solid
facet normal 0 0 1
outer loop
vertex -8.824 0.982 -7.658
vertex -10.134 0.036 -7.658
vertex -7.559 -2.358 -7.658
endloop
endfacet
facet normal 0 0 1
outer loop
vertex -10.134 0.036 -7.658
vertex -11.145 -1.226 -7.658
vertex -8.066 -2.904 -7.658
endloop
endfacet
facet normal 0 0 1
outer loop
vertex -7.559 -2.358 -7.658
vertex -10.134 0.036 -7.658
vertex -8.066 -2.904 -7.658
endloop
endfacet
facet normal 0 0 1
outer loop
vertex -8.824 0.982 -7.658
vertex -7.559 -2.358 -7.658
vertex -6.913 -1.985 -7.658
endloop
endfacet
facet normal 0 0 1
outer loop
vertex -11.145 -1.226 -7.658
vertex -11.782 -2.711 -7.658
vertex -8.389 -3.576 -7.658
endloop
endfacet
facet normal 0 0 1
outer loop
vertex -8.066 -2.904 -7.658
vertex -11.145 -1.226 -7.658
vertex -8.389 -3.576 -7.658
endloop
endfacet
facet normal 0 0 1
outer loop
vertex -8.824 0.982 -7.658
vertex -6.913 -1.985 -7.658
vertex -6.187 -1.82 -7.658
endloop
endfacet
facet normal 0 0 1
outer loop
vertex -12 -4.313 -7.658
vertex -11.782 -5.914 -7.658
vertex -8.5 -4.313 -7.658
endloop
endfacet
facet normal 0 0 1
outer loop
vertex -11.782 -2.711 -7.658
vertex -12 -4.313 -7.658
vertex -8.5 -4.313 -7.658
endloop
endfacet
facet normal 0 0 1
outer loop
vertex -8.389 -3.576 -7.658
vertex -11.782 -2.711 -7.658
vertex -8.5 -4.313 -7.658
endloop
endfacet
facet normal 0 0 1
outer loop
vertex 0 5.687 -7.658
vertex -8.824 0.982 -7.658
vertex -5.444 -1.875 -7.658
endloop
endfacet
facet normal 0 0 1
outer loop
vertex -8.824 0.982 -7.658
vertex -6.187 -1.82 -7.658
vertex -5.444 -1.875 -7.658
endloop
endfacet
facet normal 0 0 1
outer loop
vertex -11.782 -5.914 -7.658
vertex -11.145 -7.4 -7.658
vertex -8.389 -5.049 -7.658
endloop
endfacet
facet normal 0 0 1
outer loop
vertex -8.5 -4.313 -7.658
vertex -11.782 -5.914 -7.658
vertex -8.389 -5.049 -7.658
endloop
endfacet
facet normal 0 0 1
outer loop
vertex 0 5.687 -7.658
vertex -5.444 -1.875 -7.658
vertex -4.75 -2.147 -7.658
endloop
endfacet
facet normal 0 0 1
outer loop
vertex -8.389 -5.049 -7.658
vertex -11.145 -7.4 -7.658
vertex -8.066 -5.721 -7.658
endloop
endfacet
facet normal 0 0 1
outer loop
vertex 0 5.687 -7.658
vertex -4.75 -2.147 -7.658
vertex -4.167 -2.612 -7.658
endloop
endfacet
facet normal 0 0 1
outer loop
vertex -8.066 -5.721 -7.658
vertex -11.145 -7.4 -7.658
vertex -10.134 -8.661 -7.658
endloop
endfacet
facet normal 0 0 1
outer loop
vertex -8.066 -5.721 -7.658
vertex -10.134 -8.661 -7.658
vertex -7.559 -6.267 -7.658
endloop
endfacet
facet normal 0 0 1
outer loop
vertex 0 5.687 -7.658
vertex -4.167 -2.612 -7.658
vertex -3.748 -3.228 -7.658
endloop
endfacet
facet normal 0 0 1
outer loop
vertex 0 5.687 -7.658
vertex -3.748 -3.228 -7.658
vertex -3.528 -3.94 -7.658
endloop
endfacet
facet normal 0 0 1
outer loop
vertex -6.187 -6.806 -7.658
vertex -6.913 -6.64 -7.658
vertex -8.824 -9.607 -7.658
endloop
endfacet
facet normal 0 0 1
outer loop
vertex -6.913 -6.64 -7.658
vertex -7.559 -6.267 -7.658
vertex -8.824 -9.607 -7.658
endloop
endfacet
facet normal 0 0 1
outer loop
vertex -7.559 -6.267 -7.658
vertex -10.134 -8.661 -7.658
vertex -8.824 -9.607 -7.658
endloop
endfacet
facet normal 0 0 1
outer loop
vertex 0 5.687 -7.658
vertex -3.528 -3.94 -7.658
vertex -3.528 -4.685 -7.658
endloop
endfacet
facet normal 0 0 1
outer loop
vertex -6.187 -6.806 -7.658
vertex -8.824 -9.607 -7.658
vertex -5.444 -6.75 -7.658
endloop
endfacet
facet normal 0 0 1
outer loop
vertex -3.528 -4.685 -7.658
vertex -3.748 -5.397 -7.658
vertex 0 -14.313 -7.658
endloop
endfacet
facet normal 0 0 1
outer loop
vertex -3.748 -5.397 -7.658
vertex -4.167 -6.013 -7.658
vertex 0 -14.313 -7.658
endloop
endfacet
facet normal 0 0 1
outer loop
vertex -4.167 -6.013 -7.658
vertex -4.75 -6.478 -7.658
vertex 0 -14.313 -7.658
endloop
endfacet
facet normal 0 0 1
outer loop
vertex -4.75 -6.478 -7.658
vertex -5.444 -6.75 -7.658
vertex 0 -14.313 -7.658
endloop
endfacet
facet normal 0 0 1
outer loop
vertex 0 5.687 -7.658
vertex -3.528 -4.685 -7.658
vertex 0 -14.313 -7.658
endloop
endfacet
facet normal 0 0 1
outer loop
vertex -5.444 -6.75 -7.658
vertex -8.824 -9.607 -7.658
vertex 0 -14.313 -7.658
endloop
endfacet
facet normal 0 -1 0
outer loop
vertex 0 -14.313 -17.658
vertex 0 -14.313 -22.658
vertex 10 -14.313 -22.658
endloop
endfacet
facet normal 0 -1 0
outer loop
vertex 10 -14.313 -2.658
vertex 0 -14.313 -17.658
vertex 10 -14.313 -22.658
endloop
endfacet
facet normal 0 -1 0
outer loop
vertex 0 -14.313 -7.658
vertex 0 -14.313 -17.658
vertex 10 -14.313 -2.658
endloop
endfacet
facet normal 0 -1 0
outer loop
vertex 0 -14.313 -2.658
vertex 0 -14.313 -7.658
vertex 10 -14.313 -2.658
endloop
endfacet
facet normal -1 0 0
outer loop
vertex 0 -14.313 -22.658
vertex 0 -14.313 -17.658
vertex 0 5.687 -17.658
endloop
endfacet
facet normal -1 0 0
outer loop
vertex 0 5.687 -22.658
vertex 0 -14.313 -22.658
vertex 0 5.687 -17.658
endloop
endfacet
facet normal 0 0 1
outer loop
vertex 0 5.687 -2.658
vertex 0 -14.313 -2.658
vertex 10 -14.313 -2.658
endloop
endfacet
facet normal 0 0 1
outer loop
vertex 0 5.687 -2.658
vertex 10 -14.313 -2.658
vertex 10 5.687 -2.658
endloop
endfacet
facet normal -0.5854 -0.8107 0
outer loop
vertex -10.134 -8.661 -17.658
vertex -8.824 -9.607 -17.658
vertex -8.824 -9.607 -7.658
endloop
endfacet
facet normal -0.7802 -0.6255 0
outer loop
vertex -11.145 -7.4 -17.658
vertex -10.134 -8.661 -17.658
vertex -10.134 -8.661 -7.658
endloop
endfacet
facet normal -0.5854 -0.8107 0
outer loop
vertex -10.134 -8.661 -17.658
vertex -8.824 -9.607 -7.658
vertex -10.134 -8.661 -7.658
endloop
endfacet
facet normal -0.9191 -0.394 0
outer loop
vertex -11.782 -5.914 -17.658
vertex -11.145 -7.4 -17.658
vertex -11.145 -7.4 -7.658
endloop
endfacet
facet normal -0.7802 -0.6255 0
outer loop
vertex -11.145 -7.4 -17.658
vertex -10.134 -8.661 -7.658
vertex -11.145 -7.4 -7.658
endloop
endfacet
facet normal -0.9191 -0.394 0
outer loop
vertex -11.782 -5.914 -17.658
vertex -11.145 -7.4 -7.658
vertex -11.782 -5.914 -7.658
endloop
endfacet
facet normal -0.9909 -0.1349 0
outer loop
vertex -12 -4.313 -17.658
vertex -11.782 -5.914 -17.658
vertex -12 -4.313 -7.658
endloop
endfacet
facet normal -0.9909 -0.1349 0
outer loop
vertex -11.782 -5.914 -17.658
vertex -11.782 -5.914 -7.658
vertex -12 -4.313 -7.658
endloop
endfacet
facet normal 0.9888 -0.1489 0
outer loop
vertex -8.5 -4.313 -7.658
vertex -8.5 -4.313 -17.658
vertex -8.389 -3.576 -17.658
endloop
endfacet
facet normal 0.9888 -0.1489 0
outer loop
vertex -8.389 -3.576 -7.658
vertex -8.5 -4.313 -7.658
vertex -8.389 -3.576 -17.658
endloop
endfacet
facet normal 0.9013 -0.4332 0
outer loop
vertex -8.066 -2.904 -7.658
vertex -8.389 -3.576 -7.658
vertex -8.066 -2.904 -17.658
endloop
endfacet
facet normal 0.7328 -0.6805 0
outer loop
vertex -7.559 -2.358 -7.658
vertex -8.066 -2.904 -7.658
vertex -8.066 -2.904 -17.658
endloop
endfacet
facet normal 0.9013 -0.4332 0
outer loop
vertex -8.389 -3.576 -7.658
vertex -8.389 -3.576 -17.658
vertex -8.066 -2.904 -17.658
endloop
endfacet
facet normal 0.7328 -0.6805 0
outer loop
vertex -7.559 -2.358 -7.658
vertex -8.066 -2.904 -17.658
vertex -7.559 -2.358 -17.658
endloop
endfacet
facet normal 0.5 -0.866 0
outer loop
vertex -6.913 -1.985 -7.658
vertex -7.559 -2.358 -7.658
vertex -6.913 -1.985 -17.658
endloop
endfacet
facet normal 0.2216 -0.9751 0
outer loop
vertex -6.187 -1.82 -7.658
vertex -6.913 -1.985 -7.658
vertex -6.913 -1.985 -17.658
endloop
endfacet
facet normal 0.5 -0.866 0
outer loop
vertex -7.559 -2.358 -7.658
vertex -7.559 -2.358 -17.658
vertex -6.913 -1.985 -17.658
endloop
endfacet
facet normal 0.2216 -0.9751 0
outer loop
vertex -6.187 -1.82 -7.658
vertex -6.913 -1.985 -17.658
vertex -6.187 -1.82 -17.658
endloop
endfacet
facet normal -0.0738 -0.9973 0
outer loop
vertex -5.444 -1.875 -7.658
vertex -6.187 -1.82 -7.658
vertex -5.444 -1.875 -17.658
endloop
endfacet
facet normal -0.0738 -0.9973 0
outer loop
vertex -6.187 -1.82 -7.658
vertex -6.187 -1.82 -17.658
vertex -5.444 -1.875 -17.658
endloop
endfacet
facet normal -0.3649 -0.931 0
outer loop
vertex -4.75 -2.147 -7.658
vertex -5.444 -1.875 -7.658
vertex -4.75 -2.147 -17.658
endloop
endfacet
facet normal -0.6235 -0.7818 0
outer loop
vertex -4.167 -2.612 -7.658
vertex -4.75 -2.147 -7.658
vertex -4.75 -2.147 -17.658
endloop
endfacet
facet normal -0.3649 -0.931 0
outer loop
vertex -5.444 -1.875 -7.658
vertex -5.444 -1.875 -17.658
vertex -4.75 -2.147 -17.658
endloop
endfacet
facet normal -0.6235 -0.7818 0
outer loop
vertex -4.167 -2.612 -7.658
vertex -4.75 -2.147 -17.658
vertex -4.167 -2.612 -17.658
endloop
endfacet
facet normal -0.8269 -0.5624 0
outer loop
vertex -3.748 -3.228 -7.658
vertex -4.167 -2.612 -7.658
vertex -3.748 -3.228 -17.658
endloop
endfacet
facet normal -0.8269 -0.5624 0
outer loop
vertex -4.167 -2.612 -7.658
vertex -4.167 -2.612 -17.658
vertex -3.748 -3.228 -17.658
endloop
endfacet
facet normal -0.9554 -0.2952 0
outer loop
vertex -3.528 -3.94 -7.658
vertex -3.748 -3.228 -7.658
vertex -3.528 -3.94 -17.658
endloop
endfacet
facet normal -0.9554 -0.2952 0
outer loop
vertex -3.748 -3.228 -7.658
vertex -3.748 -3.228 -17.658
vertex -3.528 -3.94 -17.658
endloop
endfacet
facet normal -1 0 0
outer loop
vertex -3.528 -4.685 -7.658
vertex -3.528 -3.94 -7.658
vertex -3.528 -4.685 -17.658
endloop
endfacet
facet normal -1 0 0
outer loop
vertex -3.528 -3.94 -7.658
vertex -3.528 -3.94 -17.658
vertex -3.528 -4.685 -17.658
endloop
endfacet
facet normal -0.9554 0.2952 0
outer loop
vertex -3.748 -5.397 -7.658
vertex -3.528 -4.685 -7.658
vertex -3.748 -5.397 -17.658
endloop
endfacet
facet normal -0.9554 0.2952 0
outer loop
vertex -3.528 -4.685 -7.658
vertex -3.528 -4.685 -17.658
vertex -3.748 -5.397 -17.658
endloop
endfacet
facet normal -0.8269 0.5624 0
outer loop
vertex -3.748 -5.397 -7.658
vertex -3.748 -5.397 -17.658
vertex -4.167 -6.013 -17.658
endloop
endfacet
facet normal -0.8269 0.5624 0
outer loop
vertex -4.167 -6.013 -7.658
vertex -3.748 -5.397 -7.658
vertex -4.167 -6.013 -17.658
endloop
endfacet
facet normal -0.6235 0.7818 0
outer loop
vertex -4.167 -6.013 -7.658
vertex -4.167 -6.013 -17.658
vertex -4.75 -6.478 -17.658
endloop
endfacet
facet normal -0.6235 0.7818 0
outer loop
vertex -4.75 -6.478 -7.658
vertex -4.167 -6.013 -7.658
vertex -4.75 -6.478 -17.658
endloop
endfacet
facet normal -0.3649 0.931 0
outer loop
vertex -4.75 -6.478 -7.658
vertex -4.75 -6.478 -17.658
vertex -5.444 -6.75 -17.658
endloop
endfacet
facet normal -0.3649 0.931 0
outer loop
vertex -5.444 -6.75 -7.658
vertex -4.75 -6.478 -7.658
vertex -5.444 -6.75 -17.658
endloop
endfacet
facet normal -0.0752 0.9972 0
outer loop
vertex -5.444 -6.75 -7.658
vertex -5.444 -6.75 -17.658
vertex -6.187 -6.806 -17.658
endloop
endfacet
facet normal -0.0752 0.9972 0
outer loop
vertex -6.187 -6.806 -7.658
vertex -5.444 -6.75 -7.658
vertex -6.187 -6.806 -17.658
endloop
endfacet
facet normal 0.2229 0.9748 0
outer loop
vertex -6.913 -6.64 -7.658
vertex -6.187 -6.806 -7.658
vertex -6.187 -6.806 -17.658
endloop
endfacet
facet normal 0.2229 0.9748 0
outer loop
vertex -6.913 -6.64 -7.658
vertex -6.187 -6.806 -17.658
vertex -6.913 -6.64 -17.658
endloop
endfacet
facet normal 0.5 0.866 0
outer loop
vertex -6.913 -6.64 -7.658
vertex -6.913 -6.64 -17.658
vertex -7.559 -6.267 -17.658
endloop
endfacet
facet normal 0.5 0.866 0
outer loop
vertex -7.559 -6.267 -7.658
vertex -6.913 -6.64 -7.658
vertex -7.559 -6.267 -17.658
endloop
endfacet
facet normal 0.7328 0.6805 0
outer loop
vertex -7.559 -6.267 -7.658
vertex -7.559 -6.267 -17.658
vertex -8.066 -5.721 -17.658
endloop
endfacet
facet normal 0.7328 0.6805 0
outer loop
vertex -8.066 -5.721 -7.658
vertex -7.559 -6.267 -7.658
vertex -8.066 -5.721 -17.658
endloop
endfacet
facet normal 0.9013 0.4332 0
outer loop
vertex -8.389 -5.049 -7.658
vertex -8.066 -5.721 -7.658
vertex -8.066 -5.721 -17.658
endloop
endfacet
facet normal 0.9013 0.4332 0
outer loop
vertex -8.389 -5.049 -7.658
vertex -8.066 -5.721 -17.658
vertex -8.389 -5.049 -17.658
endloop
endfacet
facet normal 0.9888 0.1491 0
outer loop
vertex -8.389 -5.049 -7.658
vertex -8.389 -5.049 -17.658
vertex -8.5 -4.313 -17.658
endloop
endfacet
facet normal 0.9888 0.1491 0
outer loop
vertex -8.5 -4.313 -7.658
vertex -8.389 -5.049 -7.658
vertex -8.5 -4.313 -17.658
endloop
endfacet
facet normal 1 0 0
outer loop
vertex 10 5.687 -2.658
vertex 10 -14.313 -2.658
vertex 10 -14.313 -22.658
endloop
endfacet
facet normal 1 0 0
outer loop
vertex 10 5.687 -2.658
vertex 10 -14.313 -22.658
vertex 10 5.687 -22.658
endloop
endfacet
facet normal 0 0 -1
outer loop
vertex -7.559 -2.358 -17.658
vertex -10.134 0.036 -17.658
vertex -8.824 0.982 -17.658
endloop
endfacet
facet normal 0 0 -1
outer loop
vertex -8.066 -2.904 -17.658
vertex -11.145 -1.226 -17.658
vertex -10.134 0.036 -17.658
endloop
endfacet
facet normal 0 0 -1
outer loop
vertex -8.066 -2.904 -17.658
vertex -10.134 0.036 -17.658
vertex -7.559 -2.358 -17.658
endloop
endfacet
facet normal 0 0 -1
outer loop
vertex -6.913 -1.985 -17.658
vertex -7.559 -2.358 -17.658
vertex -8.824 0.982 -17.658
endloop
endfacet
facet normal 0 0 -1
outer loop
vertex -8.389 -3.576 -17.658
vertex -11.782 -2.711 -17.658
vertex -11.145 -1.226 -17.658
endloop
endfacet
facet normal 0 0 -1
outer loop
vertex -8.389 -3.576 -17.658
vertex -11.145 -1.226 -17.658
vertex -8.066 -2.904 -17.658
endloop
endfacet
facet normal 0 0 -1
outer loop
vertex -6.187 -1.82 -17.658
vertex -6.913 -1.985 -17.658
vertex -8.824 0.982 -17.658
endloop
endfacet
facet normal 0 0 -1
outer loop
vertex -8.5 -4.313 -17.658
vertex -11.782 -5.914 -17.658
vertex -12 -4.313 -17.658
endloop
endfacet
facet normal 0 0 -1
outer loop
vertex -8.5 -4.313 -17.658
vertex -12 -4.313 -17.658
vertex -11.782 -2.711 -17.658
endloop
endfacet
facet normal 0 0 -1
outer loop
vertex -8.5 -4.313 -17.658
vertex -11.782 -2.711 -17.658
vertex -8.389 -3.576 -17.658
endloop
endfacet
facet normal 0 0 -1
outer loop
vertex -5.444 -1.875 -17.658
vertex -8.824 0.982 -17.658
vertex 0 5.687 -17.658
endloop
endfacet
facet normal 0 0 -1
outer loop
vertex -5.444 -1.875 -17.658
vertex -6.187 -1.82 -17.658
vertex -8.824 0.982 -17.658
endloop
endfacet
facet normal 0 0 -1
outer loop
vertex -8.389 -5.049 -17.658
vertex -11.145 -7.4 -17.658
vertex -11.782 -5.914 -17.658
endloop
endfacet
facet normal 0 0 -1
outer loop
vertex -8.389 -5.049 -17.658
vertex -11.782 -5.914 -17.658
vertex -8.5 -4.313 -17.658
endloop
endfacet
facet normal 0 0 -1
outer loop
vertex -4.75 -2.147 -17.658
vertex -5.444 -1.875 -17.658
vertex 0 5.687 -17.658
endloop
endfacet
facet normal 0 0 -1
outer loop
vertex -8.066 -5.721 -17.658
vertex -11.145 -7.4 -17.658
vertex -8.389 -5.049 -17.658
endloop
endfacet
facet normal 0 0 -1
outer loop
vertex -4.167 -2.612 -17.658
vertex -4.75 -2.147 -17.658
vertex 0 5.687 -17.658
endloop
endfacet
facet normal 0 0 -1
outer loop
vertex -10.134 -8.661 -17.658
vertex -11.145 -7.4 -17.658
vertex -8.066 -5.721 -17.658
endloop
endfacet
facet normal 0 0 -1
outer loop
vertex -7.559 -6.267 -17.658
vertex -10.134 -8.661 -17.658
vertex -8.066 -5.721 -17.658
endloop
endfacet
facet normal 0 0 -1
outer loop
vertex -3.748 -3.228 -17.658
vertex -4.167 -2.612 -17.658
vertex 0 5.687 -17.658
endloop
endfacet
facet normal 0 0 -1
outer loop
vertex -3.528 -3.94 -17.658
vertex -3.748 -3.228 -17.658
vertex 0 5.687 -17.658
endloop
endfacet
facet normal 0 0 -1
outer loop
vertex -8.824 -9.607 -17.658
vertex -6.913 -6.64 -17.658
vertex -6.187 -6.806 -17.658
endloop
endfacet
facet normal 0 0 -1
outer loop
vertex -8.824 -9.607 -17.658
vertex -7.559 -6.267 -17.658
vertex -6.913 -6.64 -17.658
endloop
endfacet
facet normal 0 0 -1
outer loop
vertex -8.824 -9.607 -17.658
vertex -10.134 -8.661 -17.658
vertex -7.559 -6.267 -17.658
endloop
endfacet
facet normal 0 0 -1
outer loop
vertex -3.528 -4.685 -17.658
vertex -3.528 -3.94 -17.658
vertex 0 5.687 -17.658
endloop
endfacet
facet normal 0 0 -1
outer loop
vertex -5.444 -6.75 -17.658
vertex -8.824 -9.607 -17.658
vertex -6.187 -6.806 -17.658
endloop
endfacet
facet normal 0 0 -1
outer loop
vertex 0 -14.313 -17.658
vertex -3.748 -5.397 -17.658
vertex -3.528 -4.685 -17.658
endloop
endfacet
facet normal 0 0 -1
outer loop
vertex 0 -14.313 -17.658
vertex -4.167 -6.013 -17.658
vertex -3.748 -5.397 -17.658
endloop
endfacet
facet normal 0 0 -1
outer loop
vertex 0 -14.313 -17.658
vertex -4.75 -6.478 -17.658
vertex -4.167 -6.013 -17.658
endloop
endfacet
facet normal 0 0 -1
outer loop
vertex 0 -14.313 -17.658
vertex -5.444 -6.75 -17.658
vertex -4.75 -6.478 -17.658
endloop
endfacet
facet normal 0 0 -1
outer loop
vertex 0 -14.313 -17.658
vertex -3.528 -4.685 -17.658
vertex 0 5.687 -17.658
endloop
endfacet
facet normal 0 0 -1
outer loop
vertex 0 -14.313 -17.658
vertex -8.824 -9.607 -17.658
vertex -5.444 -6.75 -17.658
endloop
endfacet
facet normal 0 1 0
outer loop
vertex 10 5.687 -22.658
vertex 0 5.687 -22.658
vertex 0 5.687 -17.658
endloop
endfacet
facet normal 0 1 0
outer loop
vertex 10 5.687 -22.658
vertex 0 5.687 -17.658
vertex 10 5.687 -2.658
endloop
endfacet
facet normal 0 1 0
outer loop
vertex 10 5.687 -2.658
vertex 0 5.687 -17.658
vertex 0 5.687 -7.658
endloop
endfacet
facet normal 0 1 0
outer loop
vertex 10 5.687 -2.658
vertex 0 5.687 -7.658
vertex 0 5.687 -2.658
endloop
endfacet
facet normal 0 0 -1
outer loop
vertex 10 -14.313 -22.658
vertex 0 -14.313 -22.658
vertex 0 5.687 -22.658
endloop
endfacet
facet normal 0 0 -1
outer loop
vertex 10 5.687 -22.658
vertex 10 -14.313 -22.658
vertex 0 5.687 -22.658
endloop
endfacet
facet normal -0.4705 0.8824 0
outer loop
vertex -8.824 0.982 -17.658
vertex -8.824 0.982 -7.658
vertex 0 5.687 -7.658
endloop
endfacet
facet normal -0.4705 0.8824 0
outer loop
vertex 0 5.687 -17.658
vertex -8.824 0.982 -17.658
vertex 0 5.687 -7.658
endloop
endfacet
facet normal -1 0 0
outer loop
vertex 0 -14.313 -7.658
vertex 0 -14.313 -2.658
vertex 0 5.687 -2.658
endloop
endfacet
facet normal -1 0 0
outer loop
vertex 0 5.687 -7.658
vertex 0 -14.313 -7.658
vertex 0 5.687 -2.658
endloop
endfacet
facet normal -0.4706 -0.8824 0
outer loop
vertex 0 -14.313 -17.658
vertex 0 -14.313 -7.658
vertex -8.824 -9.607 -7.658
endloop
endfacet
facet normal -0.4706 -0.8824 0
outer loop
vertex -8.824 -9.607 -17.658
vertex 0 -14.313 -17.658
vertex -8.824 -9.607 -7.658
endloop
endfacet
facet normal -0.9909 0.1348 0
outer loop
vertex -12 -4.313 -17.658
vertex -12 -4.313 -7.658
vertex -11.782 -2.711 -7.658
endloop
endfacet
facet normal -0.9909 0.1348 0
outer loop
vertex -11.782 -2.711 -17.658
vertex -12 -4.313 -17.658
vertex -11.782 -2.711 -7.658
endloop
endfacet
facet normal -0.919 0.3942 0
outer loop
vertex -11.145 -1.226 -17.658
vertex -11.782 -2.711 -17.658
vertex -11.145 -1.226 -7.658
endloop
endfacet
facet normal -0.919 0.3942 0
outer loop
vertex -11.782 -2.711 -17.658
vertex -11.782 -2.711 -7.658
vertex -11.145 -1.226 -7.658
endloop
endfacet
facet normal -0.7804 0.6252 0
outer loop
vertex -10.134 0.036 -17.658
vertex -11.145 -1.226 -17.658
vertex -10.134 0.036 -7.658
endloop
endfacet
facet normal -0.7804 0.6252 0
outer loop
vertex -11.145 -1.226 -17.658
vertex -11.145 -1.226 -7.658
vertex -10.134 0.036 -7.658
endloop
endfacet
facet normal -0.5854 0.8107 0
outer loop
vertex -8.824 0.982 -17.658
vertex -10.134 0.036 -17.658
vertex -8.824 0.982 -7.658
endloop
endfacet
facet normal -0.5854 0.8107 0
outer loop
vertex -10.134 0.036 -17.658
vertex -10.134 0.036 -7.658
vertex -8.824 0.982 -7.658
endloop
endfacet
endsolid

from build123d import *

# Parameters (mm, degrees)
F0_W     = 20
F0_H     = 20
F1_DEPTH = 10
F2_W     = 12
F2_H     = 10
F3_DEPTH = 20
F5_DEPTH = 25
F6_D     = 5


with BuildPart() as f1:
    # F0 (on Right) → F1 (new body)
    with BuildSketch(Plane.YZ):
        with Locations((-4.31253016, -12.6576695228)):
            Rectangle(F0_W, F0_H)
    extrude(amount=F1_DEPTH)

    # F2 (on face) → F3 (join, through all)
    with BuildSketch(Plane.XZ.offset(14.31253016)):
        with Locations((-6, -12.6576695228)):
            Rectangle(F2_W, F2_H)
    extrude(amount=-F3_DEPTH)

    # F4 (on face) → F5 (cut)
    with BuildSketch(Plane.XY.offset(-7.6576695228)):
        with BuildLine():
            ThreePointArc((-12, -4.31253016), (-11.1449575543, -1.2255556274), (-8.8235294118, 0.9815874871))
            Line((-8.8235294118, 0.9815874871), (0, 5.68746984))
            Line((0, 5.68746984), (-12, 5.68746984))
            Line((-12, 5.68746984), (-12, -4.31253016))
        make_face()
        with BuildLine():
            ThreePointArc((-8.8235294118, -9.606647807), (-11.1449575543, -7.3995046925), (-12, -4.31253016))
            Line((-12, -4.31253016), (-12, -14.31253016))
            Line((-12, -14.31253016), (0, -14.31253016))
            Line((0, -14.31253016), (-8.8235294118, -9.606647807))
        make_face()
    extrude(amount=-F5_DEPTH, mode=Mode.SUBTRACT)

    # F6 (through all)
    with Locations(Plane.XY.offset(-7.6576695228)):
        with Locations((-6, -4.31253016)):
            Hole(F6_D / 2)


solid = f1.part
